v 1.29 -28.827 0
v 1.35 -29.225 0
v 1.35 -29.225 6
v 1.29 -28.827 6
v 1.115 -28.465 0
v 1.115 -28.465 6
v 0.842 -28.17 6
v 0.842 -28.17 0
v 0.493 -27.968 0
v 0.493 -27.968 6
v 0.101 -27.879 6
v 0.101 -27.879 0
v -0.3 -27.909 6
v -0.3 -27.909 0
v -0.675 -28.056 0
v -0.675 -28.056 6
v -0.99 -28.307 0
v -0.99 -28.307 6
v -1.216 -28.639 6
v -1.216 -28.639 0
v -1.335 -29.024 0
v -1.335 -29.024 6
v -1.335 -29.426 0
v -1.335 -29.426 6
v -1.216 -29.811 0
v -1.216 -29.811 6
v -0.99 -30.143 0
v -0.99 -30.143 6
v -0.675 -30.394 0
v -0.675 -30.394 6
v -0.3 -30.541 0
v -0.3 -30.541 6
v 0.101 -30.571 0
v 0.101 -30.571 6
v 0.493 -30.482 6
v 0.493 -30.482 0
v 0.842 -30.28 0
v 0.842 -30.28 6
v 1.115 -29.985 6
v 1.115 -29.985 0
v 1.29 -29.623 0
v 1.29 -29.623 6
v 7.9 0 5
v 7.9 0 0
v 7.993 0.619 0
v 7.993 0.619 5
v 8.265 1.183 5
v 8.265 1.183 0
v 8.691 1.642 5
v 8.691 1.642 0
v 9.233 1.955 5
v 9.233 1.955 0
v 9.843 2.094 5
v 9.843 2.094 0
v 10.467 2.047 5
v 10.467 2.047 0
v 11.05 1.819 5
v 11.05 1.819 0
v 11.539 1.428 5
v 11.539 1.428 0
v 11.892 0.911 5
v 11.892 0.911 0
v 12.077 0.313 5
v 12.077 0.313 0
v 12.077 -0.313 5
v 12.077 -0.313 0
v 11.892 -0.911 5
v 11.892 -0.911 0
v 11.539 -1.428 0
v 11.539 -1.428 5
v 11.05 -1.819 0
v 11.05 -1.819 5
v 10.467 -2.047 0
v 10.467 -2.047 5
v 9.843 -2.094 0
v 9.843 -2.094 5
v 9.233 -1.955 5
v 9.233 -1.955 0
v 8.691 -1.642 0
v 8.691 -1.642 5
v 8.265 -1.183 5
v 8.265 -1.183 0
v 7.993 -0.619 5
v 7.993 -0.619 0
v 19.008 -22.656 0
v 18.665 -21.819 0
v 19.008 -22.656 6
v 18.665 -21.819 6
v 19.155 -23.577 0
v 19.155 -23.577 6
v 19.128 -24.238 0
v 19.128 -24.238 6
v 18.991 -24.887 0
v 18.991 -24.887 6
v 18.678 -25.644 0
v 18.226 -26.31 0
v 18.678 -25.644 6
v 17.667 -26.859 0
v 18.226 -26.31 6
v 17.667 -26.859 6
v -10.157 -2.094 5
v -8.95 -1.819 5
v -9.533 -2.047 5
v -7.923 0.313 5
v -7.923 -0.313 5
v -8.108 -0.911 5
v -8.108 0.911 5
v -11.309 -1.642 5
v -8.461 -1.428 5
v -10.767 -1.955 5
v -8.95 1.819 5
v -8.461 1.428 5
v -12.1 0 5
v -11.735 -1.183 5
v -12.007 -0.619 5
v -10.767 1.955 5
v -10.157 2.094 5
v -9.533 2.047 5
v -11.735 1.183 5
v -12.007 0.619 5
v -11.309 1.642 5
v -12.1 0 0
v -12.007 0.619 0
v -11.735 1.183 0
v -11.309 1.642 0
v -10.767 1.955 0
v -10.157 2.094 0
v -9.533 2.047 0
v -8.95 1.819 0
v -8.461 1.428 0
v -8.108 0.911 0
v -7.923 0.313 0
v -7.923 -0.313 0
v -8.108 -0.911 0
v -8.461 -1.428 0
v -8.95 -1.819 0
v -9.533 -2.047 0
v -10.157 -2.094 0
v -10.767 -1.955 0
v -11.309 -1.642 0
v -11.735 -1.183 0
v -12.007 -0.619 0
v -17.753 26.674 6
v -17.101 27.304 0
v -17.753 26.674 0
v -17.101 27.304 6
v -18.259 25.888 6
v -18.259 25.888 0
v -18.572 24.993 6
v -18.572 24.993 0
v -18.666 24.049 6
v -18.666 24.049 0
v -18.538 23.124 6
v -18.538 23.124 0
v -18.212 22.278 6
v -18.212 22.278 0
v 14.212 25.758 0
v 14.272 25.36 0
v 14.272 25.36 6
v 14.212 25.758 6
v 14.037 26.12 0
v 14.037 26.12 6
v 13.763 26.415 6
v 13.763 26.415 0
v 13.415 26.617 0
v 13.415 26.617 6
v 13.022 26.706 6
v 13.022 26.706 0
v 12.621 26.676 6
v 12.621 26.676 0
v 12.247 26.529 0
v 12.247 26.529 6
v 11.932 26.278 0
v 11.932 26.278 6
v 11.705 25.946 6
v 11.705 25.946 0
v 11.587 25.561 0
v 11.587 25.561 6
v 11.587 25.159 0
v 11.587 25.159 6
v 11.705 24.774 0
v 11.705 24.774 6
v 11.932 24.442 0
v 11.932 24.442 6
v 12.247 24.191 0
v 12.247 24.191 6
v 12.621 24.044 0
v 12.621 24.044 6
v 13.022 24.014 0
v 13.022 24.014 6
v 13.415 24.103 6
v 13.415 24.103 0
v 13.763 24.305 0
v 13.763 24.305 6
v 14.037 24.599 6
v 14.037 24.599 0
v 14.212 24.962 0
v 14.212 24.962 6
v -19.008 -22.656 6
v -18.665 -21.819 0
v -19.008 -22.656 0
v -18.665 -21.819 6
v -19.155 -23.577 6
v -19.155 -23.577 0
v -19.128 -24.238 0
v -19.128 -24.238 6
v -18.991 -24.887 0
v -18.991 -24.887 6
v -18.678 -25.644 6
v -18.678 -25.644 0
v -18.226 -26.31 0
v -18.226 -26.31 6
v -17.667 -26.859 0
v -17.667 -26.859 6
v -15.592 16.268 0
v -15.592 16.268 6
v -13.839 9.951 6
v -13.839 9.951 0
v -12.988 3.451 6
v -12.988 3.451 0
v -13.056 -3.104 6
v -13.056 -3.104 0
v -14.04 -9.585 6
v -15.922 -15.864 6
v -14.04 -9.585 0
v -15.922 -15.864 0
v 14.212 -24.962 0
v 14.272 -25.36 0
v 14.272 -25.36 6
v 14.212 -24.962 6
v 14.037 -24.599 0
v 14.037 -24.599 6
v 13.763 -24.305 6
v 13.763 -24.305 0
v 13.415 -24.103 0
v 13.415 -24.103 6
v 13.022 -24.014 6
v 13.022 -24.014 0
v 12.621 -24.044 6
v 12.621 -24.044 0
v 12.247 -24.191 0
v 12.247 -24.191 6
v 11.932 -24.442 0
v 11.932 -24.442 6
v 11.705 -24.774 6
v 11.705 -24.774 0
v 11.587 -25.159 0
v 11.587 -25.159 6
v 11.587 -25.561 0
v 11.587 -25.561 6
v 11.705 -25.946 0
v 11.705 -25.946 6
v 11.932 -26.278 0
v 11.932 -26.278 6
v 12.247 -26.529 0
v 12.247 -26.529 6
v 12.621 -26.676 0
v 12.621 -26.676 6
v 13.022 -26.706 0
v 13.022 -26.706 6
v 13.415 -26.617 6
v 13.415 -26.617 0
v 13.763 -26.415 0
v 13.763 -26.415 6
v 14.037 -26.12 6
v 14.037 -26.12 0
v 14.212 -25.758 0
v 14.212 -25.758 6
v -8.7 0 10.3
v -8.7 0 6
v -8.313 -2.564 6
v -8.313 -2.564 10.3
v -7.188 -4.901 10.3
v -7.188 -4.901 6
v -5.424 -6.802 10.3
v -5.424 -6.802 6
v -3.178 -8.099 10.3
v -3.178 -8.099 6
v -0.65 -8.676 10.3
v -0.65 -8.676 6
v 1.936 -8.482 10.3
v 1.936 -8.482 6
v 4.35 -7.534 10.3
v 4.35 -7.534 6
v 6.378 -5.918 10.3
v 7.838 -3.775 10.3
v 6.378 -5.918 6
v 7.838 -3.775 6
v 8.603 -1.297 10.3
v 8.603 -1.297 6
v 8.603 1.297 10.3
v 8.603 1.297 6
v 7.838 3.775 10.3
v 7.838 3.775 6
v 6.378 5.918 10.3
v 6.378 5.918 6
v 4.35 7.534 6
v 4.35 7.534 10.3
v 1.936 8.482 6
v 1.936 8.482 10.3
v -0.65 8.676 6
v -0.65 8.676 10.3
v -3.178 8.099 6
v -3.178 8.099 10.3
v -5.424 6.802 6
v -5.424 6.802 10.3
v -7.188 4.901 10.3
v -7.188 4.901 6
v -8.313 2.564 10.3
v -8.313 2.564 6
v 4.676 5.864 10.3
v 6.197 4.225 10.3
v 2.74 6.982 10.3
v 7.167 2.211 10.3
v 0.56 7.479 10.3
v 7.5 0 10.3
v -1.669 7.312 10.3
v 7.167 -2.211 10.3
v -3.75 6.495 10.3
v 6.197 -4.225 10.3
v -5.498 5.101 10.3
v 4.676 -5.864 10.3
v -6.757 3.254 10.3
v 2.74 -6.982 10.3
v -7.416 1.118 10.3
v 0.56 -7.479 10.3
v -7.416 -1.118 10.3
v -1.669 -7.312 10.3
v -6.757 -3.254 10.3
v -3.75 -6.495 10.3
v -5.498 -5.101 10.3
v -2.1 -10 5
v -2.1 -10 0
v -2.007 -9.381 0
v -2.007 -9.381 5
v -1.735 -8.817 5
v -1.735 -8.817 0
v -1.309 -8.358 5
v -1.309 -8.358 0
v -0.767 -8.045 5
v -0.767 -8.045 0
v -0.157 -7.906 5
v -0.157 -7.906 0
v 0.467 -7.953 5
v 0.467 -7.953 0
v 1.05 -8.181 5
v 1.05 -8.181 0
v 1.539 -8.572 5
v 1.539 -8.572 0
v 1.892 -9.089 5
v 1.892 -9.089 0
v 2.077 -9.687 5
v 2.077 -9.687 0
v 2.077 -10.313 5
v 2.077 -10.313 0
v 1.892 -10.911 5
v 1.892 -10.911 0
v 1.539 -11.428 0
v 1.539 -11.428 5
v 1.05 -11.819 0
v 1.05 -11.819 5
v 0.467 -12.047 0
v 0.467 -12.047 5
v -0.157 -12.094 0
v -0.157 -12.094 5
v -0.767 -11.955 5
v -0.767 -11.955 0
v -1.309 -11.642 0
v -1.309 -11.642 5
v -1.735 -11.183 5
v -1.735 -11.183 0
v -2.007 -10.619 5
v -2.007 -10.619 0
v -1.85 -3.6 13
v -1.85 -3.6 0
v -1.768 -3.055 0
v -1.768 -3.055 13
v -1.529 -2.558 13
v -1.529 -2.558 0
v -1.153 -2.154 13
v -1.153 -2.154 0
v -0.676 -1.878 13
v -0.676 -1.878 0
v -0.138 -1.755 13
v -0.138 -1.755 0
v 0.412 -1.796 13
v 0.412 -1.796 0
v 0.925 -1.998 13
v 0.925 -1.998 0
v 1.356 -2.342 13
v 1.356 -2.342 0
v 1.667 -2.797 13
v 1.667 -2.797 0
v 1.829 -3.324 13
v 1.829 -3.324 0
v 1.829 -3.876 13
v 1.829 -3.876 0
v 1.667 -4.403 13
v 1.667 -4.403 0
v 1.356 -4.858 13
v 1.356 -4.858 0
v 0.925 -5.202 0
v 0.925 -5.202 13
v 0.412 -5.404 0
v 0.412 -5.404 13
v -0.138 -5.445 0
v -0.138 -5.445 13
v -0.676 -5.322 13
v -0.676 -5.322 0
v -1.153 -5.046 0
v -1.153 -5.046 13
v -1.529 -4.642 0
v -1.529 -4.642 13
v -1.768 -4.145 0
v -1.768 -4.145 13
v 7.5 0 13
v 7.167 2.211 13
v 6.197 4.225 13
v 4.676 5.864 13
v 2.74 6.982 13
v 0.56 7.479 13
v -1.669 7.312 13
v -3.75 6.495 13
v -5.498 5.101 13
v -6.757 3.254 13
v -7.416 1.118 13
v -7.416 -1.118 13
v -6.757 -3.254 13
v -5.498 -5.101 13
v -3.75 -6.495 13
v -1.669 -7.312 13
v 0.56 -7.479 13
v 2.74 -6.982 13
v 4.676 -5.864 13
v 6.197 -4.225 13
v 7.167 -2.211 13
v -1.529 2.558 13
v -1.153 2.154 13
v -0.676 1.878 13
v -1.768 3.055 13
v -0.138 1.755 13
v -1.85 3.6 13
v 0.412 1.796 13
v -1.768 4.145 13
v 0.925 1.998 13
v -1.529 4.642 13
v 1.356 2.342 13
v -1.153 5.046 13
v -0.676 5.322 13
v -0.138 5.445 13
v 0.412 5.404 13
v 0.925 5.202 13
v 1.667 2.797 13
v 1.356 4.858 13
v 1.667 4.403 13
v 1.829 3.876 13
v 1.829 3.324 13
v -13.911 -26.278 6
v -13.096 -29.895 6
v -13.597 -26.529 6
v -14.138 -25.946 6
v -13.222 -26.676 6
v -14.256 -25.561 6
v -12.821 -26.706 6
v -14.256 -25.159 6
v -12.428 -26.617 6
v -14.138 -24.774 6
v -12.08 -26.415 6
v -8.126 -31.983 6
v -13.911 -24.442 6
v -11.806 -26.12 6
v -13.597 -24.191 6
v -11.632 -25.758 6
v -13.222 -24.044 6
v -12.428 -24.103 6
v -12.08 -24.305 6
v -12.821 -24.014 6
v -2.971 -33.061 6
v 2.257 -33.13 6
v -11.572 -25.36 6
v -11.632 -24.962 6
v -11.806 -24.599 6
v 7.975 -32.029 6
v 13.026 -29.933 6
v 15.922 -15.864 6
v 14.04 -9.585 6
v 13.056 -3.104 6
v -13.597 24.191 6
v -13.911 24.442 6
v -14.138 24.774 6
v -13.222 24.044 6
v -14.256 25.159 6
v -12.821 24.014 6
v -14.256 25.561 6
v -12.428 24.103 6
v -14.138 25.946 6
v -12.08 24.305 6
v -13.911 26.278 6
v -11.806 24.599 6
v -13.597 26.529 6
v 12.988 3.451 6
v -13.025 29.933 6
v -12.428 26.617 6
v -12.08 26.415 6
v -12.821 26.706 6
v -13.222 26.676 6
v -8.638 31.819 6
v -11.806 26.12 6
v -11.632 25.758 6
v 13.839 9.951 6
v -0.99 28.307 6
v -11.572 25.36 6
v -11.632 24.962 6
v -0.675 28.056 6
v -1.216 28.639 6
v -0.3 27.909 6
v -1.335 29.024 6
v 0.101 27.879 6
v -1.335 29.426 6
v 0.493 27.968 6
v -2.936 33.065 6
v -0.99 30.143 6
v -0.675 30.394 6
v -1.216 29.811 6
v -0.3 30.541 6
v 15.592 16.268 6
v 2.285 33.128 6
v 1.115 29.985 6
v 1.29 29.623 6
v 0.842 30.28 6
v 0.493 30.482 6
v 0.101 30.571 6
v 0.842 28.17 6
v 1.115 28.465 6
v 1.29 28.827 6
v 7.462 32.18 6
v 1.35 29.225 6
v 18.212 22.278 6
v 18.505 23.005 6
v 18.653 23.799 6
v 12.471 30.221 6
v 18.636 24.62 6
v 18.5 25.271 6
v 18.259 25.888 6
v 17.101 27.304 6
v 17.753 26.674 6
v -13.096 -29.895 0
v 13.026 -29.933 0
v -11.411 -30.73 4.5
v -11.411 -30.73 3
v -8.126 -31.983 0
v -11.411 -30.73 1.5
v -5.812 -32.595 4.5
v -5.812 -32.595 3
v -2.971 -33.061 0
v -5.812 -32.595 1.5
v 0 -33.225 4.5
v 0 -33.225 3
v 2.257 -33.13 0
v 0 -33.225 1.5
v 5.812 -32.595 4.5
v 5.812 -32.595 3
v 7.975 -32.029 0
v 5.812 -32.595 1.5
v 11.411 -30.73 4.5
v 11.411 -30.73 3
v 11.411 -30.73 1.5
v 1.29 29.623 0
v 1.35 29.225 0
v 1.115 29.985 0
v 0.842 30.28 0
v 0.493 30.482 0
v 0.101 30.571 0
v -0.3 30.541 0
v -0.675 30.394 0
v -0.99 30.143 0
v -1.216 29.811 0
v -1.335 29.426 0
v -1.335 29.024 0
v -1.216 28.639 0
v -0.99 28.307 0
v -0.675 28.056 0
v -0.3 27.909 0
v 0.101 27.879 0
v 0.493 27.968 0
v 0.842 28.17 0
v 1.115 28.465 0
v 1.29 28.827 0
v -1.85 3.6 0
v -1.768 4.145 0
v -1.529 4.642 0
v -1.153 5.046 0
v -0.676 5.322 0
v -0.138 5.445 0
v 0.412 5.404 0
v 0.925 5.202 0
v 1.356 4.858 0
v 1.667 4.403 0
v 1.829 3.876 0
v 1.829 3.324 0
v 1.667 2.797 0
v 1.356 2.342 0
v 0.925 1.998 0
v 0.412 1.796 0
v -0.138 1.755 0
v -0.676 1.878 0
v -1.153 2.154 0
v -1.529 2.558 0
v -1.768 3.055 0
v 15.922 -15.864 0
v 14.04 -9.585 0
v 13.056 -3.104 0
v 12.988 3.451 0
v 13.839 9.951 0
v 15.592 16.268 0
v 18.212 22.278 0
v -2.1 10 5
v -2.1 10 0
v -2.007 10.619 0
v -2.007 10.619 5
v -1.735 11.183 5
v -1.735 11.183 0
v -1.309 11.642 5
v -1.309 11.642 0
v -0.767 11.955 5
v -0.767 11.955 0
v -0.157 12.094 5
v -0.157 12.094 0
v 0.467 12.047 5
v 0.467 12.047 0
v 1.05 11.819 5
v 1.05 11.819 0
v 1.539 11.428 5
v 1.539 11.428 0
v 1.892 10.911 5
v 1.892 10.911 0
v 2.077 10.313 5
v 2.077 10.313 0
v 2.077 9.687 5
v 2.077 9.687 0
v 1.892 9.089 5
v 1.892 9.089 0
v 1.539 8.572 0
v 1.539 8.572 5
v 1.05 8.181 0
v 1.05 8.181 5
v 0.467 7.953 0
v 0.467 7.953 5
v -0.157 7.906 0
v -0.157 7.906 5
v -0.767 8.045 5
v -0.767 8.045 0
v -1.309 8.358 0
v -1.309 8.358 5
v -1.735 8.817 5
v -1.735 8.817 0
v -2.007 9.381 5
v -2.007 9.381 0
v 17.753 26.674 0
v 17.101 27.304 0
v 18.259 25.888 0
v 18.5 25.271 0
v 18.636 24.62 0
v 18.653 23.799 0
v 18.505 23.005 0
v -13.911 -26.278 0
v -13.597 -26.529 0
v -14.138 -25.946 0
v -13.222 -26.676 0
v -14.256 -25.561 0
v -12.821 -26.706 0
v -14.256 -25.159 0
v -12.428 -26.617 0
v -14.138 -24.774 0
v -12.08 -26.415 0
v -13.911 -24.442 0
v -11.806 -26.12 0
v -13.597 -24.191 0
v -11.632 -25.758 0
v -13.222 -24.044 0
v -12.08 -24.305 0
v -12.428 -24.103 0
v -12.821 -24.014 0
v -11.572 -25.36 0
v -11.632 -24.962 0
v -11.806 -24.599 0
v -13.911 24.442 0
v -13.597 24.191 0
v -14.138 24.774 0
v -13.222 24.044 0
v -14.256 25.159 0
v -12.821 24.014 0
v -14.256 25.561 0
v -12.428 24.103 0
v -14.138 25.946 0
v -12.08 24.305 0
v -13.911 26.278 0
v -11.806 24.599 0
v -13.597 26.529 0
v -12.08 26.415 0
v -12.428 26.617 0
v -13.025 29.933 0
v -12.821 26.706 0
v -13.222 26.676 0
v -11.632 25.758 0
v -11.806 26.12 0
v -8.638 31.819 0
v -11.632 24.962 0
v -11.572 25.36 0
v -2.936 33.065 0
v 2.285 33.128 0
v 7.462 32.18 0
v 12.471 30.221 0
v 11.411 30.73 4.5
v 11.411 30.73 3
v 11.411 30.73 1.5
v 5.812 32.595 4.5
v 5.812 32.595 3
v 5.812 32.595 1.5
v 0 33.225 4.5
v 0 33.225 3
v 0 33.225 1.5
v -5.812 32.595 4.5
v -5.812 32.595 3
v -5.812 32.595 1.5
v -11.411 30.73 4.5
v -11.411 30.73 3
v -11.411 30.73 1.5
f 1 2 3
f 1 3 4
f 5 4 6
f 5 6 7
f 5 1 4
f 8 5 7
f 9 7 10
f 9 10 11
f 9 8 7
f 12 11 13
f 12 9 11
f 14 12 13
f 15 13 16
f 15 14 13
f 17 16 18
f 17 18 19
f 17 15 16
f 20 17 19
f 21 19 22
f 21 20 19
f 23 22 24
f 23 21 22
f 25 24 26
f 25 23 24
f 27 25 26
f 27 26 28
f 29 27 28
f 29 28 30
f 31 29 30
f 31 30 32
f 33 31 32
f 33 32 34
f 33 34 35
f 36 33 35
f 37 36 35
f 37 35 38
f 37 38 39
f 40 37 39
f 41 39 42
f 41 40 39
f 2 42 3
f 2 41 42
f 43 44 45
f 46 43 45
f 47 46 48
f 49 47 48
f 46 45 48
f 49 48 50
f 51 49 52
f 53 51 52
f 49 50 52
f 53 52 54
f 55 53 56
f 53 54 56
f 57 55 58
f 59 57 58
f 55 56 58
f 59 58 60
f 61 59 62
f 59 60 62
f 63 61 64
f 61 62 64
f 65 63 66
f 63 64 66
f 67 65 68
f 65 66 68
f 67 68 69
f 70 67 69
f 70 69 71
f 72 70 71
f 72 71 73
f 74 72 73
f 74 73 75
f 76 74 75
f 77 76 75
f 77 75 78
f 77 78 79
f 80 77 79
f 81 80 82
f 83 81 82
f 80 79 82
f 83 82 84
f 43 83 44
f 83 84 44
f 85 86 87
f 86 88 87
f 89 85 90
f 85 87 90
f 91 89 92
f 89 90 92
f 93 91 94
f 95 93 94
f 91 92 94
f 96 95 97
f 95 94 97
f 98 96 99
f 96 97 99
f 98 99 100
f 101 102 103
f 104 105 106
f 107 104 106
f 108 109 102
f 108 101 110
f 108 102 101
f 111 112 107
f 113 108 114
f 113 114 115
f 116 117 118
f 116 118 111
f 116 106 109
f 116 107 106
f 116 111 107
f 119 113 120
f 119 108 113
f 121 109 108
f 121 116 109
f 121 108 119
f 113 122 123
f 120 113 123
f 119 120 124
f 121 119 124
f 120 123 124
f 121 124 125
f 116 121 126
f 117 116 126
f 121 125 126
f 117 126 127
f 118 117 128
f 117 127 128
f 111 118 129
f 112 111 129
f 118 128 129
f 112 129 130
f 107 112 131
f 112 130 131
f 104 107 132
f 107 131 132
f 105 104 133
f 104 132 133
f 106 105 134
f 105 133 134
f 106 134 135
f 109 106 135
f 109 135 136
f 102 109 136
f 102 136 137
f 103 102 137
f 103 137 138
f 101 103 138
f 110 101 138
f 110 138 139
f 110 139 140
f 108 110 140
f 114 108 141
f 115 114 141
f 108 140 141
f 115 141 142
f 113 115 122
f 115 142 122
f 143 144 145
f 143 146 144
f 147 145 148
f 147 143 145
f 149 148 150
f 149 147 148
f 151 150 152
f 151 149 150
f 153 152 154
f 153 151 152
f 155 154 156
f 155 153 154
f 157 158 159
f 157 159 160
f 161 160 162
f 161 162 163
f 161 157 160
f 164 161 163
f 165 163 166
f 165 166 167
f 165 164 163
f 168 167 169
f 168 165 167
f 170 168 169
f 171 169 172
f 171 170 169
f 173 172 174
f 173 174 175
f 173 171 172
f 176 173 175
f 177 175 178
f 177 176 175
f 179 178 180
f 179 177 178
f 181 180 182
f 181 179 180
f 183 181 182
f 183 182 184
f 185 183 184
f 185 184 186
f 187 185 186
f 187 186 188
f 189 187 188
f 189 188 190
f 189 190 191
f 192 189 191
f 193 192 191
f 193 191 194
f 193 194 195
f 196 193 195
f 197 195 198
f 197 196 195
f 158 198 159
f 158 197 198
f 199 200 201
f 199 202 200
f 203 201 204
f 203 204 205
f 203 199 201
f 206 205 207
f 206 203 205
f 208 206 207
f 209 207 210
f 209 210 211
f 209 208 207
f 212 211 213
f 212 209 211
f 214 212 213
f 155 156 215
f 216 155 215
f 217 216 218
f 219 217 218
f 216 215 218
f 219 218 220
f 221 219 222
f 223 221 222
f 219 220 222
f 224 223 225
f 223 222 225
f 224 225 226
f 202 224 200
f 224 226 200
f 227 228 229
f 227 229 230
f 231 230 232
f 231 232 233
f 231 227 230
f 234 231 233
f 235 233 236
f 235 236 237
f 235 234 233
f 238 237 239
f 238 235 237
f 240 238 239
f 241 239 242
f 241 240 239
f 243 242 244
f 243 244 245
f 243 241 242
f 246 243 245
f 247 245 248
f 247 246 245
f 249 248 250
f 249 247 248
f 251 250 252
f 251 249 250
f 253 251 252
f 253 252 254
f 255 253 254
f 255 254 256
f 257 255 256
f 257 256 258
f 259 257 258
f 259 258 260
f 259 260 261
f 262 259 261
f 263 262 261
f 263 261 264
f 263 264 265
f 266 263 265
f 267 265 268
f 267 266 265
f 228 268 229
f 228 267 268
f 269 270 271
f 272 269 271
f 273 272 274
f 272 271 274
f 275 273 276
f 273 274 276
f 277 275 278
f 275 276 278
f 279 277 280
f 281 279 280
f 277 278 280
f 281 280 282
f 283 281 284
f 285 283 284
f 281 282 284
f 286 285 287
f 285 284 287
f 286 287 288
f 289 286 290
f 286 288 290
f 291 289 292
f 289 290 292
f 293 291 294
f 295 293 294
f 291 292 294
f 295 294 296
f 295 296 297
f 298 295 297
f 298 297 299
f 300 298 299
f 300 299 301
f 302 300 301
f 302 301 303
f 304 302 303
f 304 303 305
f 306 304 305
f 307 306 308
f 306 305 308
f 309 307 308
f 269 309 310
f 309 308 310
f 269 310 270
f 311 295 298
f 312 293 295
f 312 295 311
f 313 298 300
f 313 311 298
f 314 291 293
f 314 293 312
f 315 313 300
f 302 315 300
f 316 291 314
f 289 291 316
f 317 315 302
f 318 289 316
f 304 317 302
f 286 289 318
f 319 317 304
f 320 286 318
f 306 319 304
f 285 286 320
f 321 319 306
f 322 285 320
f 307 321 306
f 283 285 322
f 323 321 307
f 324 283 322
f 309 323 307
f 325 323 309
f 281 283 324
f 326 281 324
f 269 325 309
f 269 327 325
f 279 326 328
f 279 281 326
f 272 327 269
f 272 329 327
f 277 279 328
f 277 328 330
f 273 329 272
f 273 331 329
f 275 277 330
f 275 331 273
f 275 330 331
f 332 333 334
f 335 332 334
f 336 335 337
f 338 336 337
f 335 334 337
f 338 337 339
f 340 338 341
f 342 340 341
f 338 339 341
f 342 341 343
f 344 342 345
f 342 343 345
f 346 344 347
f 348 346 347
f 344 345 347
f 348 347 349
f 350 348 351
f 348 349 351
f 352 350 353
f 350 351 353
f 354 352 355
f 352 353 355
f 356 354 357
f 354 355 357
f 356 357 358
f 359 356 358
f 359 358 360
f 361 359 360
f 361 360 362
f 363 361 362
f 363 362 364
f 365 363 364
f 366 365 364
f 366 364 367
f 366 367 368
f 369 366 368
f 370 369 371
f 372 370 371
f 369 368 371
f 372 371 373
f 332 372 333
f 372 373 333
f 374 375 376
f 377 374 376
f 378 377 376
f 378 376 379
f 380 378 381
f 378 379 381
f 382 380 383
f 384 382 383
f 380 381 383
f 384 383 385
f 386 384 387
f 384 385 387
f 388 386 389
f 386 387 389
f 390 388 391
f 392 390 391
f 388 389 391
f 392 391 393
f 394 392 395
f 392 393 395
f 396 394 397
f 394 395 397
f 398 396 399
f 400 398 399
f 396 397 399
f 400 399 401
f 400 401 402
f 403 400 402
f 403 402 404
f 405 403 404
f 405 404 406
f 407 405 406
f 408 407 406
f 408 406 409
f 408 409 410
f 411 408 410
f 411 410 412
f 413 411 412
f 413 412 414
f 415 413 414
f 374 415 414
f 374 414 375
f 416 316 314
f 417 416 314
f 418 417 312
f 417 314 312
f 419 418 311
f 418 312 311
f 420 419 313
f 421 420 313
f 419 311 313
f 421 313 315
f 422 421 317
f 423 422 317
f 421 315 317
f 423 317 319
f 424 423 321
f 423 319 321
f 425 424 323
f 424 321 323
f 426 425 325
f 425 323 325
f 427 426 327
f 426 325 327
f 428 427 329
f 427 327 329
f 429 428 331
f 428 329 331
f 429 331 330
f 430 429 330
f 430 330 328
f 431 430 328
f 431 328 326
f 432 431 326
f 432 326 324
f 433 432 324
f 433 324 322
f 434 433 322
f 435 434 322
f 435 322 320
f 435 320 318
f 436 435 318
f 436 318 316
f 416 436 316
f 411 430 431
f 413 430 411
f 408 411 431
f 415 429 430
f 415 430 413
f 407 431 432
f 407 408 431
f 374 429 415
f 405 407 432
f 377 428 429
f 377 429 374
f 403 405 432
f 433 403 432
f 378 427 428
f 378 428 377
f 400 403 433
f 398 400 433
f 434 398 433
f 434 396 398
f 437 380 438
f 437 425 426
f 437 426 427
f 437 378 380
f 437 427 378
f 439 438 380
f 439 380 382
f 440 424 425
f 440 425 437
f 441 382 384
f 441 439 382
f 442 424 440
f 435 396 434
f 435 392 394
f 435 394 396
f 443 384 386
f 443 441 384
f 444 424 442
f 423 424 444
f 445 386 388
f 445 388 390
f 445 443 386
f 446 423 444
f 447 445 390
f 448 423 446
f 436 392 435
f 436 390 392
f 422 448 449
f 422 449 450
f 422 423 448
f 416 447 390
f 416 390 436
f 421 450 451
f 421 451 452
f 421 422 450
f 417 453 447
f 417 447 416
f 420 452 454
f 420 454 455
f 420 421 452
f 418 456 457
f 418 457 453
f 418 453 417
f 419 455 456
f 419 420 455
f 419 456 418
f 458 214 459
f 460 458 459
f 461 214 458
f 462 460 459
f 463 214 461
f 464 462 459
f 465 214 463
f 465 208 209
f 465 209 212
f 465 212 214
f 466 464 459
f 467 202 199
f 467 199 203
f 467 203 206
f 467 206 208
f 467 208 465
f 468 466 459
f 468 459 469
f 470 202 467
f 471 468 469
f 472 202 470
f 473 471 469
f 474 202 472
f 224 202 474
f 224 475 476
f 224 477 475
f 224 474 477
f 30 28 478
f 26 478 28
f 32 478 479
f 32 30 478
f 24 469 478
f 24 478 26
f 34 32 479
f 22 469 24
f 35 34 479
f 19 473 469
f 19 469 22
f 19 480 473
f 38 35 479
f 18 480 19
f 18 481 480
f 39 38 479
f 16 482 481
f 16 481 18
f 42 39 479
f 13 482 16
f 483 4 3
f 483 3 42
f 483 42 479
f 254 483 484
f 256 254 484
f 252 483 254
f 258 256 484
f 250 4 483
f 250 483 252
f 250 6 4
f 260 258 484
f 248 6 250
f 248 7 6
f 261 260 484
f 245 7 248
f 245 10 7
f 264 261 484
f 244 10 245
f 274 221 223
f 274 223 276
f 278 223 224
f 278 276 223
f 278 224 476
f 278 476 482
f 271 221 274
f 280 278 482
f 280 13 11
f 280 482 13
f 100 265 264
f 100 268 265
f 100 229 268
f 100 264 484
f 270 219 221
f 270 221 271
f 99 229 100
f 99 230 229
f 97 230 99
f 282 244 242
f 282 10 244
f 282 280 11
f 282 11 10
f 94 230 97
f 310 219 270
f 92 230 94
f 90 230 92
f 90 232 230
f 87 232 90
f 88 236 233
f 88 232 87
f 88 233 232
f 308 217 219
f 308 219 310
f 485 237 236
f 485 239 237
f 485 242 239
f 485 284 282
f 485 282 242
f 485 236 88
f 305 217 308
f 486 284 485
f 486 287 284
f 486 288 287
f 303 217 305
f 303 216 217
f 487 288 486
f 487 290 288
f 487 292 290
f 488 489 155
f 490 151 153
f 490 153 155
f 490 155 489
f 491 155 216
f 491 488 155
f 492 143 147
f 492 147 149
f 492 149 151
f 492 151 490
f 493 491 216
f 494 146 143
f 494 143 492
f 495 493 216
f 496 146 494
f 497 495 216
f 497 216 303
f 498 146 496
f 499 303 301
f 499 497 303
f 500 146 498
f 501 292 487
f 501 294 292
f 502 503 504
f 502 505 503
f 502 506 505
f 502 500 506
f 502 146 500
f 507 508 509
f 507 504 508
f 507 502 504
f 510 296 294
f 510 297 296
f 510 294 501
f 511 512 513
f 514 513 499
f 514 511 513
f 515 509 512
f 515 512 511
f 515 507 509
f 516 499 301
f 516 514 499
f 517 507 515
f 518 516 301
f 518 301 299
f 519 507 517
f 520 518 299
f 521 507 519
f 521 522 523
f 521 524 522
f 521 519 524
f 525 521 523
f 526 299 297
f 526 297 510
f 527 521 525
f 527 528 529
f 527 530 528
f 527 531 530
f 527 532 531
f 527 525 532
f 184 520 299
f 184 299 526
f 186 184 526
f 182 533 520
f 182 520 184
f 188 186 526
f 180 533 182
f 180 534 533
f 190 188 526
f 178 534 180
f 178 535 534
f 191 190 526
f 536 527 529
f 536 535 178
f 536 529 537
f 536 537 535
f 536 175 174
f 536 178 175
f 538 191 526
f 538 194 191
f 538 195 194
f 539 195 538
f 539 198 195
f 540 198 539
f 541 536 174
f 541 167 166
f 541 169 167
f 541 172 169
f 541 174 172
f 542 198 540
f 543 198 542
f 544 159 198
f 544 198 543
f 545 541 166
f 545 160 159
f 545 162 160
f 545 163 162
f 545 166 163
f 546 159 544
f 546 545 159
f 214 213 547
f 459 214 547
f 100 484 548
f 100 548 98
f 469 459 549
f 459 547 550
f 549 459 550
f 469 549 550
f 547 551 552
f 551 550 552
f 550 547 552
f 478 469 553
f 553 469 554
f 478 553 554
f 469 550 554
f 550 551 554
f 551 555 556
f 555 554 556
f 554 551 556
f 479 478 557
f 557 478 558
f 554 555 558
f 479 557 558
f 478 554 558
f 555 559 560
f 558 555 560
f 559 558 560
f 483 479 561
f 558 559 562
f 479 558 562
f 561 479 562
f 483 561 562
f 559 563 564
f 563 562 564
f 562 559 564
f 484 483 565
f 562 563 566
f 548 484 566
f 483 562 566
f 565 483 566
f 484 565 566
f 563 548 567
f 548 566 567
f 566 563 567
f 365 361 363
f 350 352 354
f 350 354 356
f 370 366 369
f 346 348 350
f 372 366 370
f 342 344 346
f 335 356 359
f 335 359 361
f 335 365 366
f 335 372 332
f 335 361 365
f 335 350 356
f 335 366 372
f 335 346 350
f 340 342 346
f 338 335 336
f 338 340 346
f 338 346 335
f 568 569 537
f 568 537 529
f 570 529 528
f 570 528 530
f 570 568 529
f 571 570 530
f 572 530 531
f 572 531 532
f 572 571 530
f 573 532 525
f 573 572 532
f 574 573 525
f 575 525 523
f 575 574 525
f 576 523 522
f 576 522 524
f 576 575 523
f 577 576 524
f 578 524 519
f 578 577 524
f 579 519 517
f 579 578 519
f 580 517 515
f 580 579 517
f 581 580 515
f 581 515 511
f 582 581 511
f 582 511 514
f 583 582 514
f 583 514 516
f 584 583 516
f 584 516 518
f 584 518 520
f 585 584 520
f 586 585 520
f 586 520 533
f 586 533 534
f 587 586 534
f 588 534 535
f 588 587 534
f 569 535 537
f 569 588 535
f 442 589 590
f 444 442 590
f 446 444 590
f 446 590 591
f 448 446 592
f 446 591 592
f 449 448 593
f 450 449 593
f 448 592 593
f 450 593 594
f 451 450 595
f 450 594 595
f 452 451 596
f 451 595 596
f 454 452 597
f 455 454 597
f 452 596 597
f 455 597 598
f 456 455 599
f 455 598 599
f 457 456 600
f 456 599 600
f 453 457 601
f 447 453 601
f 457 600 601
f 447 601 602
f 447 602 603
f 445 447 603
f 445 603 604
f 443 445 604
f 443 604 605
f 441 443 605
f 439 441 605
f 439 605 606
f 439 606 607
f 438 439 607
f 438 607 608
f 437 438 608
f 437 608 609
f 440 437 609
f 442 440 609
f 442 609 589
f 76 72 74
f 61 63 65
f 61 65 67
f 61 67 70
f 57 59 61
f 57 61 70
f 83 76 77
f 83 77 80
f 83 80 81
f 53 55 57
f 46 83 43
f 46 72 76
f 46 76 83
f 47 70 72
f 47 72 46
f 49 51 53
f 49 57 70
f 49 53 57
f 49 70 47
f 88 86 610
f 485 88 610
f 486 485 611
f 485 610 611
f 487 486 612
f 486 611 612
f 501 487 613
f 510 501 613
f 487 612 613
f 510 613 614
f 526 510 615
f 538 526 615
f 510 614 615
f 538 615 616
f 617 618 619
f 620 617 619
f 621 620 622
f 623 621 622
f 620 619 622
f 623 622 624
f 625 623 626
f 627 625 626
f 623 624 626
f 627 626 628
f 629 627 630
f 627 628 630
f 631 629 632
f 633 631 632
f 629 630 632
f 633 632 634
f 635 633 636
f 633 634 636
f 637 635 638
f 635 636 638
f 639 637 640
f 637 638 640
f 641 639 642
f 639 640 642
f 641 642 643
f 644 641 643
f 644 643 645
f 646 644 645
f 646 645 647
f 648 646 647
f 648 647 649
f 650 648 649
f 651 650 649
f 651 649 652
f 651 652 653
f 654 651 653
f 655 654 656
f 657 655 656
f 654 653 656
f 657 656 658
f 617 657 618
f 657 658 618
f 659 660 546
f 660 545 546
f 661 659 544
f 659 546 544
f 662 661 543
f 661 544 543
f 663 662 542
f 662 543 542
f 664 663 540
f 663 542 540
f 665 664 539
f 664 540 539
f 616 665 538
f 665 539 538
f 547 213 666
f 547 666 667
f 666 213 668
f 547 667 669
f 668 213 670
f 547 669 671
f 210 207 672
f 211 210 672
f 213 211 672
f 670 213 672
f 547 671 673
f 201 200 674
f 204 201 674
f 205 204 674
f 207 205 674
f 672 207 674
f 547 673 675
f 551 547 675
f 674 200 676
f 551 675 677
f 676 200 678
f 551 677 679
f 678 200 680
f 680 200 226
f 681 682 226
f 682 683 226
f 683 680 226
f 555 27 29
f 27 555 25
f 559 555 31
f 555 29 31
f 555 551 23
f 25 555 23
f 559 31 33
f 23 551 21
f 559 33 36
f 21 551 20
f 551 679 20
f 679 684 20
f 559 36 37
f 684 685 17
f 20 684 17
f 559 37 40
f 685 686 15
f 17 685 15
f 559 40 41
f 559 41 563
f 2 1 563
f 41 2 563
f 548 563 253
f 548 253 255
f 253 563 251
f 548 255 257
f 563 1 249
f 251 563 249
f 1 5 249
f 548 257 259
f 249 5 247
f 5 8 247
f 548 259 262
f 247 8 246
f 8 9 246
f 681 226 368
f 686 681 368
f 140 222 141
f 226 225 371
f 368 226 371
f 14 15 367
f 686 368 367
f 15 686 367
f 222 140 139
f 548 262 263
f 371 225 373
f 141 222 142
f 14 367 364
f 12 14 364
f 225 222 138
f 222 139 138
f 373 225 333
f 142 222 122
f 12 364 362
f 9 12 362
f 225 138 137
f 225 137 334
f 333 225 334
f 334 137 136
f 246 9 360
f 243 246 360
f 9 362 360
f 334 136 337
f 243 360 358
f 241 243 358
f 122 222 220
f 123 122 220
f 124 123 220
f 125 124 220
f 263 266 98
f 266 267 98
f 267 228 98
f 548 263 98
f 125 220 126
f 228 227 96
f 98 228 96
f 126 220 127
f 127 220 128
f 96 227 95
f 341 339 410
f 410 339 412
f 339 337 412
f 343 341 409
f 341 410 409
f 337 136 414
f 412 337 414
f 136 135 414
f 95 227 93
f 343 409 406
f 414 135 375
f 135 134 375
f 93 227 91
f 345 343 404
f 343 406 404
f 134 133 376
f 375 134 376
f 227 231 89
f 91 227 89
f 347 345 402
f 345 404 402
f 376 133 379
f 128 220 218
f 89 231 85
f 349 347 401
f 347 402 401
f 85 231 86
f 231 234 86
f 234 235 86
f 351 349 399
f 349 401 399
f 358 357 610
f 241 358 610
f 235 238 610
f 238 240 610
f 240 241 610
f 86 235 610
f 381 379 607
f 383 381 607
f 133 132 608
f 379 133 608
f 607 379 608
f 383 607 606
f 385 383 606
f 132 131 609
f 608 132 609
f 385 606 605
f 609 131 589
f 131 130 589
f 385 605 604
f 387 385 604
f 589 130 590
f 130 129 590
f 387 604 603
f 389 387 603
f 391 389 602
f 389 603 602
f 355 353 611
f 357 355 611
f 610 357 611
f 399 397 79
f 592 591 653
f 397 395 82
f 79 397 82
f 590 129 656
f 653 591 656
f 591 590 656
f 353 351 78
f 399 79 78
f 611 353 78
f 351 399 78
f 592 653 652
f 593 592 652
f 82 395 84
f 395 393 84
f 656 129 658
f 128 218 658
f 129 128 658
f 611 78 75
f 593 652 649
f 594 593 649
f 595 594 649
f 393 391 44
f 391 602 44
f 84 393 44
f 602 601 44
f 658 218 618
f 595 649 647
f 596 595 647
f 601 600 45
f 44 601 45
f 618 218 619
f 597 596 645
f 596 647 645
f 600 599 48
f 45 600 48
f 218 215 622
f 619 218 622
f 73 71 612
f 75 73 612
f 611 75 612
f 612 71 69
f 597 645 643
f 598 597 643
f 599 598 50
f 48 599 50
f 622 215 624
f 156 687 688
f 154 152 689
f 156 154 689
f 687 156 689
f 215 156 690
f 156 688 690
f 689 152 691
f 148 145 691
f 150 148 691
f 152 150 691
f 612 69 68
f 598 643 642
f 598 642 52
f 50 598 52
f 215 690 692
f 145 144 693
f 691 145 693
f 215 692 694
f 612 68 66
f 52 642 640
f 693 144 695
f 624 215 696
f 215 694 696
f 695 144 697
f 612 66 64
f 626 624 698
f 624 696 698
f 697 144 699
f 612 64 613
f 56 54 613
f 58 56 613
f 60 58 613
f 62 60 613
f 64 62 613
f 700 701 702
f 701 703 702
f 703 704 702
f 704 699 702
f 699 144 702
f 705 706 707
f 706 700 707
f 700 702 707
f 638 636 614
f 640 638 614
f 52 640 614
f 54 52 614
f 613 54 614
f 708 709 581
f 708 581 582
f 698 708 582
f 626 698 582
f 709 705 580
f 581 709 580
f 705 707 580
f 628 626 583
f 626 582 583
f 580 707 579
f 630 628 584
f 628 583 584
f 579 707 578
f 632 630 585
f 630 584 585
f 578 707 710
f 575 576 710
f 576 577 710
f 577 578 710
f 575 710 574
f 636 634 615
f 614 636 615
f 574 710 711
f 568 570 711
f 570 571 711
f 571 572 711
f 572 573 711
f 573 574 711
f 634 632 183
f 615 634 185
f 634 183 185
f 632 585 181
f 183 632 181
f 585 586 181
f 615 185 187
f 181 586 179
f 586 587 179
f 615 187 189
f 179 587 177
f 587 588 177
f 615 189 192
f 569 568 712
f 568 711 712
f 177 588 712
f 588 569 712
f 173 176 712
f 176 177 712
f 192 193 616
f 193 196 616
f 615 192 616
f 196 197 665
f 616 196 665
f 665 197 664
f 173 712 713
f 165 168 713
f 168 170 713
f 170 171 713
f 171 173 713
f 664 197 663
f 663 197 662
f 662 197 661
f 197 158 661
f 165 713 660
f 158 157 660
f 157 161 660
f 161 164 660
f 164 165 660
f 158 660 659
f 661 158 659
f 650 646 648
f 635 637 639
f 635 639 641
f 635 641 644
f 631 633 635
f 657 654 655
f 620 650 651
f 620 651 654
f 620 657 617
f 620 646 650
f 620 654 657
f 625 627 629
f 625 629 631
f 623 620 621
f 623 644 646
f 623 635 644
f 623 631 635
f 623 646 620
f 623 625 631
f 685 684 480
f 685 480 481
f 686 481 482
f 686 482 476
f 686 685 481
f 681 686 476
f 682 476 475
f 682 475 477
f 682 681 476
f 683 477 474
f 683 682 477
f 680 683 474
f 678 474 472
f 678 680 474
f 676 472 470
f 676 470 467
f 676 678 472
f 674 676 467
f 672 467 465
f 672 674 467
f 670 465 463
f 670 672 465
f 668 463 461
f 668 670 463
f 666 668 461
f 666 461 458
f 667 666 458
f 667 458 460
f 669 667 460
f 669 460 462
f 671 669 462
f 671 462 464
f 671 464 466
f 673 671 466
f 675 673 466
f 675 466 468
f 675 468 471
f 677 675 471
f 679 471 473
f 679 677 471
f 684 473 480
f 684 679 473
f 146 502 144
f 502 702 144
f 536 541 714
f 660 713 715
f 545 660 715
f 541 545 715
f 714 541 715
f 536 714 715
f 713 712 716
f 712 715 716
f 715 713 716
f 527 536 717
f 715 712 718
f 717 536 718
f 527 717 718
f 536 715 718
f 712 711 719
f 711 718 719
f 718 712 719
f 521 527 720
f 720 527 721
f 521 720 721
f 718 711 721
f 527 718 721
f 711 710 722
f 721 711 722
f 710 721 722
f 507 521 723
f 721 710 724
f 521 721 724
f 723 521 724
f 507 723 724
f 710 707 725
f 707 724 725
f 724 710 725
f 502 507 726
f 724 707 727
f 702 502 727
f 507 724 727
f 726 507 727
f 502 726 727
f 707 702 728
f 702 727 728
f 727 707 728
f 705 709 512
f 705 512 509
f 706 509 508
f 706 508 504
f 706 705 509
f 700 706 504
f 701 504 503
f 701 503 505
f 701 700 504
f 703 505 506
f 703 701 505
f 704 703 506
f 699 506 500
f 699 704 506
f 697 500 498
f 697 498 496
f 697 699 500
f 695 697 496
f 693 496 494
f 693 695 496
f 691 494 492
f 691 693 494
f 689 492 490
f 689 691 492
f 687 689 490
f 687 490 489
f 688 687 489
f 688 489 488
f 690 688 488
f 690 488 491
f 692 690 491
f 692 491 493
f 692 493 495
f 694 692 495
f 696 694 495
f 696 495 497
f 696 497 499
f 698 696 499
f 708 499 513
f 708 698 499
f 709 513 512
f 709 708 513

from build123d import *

# Parameters (mm, degrees)
BOSS_EXTRUDE1_OUTLINE_R = 1.35
BOSS_EXTRUDE1_DEPTH     = 6
FILLET2_R               = 4
SKETCH6_R               = 7.5
BOSS_EXTRUDE5_DEPTH     = 7
SKETCH7_R               = 1.85
CUT_EXTRUDE2_DEPTH      = 41.49625976
SKETCH8_R               = 2.1
CUT_EXTRUDE3_DEPTH      = 5
SKETCH10_R              = 8.7
SKETCH10_R_2            = 7.5
BOSS_EXTRUDE6_DEPTH     = 4.3


# Read off the part's stored shape, not the designer's step: Boss-Extrude1
with BuildPart() as part:
    # Boss-Extrude1 outline → Boss-Extrude1 (new body)
    with BuildSketch(Plane.XY):
        with BuildLine():
            add(Edge.make_bspline(
                [(19.759245017, 25.011508548), (17.277632704, 27.410130174), (11.065749819, 31.662666447), (3.898055626, 33.225), (0, 33.225), (-3.898055626, 33.225), (-11.065749819, 31.662666447), (-17.277632704, 27.410130174), (-19.759245017, 25.011508548)],
                knots=[5.561095323, 5.561095323, 5.561095323, 5.561095323, 5.890486225, 6.283185307, 6.283185307, 6.283185307, 6.675884389, 7.005275292, 7.005275292, 7.005275292, 7.005275292], degree=3))
            ThreePointArc((-19.759245017, 25.011508548), (-12.906795412, 0.176983829), (-20.263531469, -24.512854531))
            add(Edge.make_bspline(
                [(-20.263531469, -24.512854531), (-17.664381341, -27.142112776), (-11.289415252, -31.613914365), (0, -34.074654426), (11.289415252, -31.613914365), (17.664381341, -27.142112776), (20.263531469, -24.512854531)],
                knots=[2.396970099, 2.396970099, 2.396970099, 2.396970099, 2.748893572, 3.141592654, 3.534291735, 3.886215208, 3.886215208, 3.886215208, 3.886215208], degree=3))
            ThreePointArc((20.263531469, -24.512854531), (12.906795412, 0.176983829), (19.759245017, 25.011508548))
        make_face()
        with Locations((-12.92155431, -25.359978236)):
            Circle(BOSS_EXTRUDE1_OUTLINE_R, mode=Mode.SUBTRACT)
        with Locations((0, -29.225)):
            Circle(BOSS_EXTRUDE1_OUTLINE_R, mode=Mode.SUBTRACT)
        with Locations((12.92155431, -25.359978236)):
            Circle(BOSS_EXTRUDE1_OUTLINE_R, mode=Mode.SUBTRACT)
        with Locations((-12.92155431, 25.359978236)):
            Circle(BOSS_EXTRUDE1_OUTLINE_R, mode=Mode.SUBTRACT)
        with Locations((0, 29.225)):
            Circle(BOSS_EXTRUDE1_OUTLINE_R, mode=Mode.SUBTRACT)
        with Locations((12.92155431, 25.359978236)):
            Circle(BOSS_EXTRUDE1_OUTLINE_R, mode=Mode.SUBTRACT)
    extrude(amount=BOSS_EXTRUDE1_DEPTH)

    # Fillet2
    fillet2_edges = [part.edges().sort_by_distance(p)[0] for p in [
        (-20.263531469, -24.512854531, 3),
        (-19.759245017, 25.011508548, 3),
        (19.759245017, 25.011508548, 3),
        (20.263531469, -24.512854531, 3),
    ]]
    fillet(fillet2_edges, radius=FILLET2_R)

    # Sketch6 → Boss-Extrude5 (add)
    with BuildSketch(Plane.XY.offset(6)):
        Circle(SKETCH6_R)
    extrude(amount=BOSS_EXTRUDE5_DEPTH)

    # Sketch7 → Cut-Extrude2 (cut, through all)
    with BuildSketch(Plane(origin=(0, 0, 0), x_dir=(-1, 0, 0), z_dir=(0, 0, -1))):
        with Locations((0, 3.6)):
            Circle(SKETCH7_R)
        with Locations((0, -3.6)):
            Circle(SKETCH7_R)
    extrude(amount=-CUT_EXTRUDE2_DEPTH, mode=Mode.SUBTRACT)

    # Sketch8 → Cut-Extrude3 (cut)
    with BuildSketch(Plane(origin=(0, 0, 0), x_dir=(-1, 0, 0), z_dir=(0, 0, -1))):
        with Locations((10, 0)):
            Circle(SKETCH8_R)
        with Locations((0, -10)):
            Circle(SKETCH8_R)
        with Locations((-10, 0)):
            Circle(SKETCH8_R)
        with Locations((0, 10)):
            Circle(SKETCH8_R)
    extrude(amount=-CUT_EXTRUDE3_DEPTH, mode=Mode.SUBTRACT)

    # Sketch10 → Boss-Extrude6 (add)
    with BuildSketch(Plane.XY.offset(6)):
        with Locations(Location((0, 0, 0), (0, 0, 180))):
            Circle(SKETCH10_R)
        Circle(SKETCH10_R_2, mode=Mode.SUBTRACT)
    extrude(amount=BOSS_EXTRUDE6_DEPTH)


solid = part.part
